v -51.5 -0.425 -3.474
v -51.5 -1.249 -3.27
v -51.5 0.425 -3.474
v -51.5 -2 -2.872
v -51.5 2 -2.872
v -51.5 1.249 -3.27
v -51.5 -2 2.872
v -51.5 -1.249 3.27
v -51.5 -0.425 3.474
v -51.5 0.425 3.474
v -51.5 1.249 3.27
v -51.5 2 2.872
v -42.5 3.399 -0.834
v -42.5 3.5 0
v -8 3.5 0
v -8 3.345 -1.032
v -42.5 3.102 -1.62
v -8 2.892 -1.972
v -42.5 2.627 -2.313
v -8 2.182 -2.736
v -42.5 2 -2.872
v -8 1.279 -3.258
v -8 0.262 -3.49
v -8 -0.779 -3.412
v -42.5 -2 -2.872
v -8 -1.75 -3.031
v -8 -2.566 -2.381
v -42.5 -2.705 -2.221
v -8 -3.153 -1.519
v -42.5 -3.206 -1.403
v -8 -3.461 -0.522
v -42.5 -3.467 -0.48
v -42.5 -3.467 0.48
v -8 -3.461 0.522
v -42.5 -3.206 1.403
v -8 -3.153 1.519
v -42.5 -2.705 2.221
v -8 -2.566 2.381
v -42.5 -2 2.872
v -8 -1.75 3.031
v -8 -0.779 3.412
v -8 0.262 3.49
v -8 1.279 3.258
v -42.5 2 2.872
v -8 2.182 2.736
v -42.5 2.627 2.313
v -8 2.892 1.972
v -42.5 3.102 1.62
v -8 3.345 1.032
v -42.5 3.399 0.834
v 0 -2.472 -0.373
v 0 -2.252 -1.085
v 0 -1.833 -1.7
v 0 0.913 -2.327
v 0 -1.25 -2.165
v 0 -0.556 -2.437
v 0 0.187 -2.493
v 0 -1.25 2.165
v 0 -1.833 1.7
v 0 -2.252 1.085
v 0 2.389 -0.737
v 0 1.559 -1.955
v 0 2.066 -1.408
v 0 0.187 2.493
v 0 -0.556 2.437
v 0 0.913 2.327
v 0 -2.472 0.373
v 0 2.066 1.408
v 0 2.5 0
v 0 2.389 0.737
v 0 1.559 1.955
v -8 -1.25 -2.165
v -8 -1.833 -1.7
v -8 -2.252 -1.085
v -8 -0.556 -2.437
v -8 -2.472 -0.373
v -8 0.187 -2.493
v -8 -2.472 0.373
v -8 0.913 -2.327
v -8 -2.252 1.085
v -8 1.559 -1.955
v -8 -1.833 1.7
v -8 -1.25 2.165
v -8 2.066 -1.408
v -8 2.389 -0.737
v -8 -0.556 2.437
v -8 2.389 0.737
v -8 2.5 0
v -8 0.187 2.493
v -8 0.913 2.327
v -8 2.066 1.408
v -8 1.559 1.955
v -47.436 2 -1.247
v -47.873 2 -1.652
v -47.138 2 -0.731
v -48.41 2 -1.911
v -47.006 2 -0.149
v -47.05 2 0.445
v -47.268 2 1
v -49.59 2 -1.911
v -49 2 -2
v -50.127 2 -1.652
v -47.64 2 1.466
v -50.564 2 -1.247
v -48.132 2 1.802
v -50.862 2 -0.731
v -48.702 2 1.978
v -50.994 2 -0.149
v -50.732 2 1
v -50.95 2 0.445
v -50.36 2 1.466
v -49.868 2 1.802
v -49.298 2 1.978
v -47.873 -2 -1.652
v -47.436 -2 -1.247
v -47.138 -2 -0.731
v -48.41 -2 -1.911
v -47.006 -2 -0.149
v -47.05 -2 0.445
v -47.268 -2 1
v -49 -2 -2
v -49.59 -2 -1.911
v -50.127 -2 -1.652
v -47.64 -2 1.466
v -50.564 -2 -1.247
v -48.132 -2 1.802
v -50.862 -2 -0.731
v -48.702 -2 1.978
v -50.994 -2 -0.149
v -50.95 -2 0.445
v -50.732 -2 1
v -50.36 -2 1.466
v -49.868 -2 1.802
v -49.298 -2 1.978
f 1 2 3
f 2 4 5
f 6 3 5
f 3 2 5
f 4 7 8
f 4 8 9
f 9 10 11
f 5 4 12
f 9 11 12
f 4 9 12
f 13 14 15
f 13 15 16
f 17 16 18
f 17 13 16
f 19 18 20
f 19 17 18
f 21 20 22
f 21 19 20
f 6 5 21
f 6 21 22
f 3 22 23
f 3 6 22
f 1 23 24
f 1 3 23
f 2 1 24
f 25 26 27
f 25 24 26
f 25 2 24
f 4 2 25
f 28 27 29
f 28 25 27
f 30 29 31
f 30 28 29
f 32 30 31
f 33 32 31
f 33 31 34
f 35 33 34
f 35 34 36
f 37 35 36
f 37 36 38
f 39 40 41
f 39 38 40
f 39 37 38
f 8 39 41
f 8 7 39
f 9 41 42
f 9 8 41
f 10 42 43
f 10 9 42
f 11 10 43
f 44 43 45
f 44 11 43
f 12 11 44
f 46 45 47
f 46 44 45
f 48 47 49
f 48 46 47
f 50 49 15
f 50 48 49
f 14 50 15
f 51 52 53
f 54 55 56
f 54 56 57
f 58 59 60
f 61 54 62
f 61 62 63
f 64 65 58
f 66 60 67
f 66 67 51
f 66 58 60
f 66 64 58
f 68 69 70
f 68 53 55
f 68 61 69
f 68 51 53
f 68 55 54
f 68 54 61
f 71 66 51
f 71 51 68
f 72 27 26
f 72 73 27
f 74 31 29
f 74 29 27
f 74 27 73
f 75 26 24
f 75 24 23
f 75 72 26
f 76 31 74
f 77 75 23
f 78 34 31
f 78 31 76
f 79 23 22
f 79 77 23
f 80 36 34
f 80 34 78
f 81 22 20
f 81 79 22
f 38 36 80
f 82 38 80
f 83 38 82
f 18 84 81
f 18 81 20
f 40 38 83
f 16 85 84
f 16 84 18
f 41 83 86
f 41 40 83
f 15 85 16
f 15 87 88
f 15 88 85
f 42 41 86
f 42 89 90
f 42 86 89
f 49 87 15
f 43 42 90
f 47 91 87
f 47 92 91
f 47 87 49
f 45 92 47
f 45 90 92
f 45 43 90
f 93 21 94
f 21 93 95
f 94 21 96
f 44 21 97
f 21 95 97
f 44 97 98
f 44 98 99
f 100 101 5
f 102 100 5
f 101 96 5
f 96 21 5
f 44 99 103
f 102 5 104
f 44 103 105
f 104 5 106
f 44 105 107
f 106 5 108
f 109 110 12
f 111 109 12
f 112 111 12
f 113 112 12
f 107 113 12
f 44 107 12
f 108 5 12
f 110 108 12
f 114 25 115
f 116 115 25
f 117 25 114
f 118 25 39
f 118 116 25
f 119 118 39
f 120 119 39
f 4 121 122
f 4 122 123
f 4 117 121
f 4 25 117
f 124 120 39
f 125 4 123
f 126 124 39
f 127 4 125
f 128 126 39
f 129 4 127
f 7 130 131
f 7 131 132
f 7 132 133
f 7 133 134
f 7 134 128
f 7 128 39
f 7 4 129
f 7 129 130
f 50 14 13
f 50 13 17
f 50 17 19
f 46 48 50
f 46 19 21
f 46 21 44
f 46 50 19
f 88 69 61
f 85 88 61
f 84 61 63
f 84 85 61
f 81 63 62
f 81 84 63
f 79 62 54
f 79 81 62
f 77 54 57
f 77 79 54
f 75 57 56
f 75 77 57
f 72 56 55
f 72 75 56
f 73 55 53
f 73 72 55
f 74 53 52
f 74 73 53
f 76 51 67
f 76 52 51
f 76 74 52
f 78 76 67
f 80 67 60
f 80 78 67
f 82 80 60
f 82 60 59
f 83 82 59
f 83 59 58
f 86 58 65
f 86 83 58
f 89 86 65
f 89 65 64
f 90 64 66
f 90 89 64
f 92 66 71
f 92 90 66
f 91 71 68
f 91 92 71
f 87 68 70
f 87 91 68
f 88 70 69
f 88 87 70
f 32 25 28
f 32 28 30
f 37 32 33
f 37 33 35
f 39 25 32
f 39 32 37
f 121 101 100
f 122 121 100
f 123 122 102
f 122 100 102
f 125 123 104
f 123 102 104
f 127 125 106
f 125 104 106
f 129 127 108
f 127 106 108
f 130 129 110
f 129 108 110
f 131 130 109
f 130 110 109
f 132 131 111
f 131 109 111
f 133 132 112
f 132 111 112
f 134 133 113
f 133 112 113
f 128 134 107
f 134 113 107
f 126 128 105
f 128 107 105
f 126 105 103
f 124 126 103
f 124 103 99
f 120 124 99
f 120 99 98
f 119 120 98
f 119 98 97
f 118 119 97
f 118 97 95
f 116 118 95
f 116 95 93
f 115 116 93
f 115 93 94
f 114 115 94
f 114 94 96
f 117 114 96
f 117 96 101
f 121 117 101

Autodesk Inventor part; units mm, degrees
ref_plane "YZ Plane" through (0, 0, 0) normal (1, 0, 0) x (0, 1, 0)
ref_plane "XZ Plane" through (0, 0, 0) normal (0, 1, 0) x (-1, 0, 0)
ref_plane "XY Plane" through (0, 0, 0) normal (0, 0, 1) x (1, 0, 0)
sketch "Sketch1" plane through (0, 0, 0) normal (0, 0, 1) x (1, 0, 0)
  line L0 (0, 0) -> (0, 2.5)
  line L1 (0, 2.5) -> (-8, 2.5)
  line L2 (-8, 2.5) -> (-8, 3.5)
  line L3 (-8, 3.5) -> (-51.5, 3.5)
  line L4 (-51.5, 3.5) -> (-51.5, 0)
  line L5 (-51.5, 0) -> (0, 0)
  point P0 (-4, 2.5)
  dimension "d0" = 5
  dimension "d1" = 7
  dimension "d2" = 8
  dimension "d19" = 43.5
revolve "Revolution1" add sketch "Sketch1" angle 360 about axis through (-51.5, 0, 0) along (1, 0, 0)
thread "Thread1" size "M5x0.8" class "6g" standard "ISO Metric profile" full length
sketch "Sketch3" plane through (-51.5, 0, 0) normal (-1, 0, 0) x (0, 0, 1)
  circle A0 centre (0, 0) radius 3.5 projected
  line L0 (-2.8723, 2) -> (2.8723, 2)
  circle A1 centre (0, 0) radius 3.5 projected
  line L1 (-2.8723, -2) -> (2.8723, -2)
  arc A2 (-2.8723, 2) -> (-2.8723, -2) centre (0, 0) ccw
  arc A3 (2.8723, -2) -> (2.8723, 2) centre (0, 0) ccw
  point P0 (0, 0)
  dimension "d7" = 2
  dimension "d8" = 2
extrude "Extrusion1" cut sketch "Sketch3" against normal blind 9 contours L0 A0 | A0 L1
sketch "Sketch4" plane through (-51.5, -2, -2.8723) normal (0, -1, 0) x (1, 0, 0)
  line L0 (0, 0) -> (0, 5.7446) projected
  point P0 (51.5, 2.8723)
  point P1 (2.5, 2.8723)
  point P2 (0, 2.8723)
  dimension "d11" = 2.5
hole "Hole1" at (-49, -2, 0) direction (0, 1, 0) diameter 4 depth 4
equation "\"d8\" = d7"
properties part number "11 fitting"
